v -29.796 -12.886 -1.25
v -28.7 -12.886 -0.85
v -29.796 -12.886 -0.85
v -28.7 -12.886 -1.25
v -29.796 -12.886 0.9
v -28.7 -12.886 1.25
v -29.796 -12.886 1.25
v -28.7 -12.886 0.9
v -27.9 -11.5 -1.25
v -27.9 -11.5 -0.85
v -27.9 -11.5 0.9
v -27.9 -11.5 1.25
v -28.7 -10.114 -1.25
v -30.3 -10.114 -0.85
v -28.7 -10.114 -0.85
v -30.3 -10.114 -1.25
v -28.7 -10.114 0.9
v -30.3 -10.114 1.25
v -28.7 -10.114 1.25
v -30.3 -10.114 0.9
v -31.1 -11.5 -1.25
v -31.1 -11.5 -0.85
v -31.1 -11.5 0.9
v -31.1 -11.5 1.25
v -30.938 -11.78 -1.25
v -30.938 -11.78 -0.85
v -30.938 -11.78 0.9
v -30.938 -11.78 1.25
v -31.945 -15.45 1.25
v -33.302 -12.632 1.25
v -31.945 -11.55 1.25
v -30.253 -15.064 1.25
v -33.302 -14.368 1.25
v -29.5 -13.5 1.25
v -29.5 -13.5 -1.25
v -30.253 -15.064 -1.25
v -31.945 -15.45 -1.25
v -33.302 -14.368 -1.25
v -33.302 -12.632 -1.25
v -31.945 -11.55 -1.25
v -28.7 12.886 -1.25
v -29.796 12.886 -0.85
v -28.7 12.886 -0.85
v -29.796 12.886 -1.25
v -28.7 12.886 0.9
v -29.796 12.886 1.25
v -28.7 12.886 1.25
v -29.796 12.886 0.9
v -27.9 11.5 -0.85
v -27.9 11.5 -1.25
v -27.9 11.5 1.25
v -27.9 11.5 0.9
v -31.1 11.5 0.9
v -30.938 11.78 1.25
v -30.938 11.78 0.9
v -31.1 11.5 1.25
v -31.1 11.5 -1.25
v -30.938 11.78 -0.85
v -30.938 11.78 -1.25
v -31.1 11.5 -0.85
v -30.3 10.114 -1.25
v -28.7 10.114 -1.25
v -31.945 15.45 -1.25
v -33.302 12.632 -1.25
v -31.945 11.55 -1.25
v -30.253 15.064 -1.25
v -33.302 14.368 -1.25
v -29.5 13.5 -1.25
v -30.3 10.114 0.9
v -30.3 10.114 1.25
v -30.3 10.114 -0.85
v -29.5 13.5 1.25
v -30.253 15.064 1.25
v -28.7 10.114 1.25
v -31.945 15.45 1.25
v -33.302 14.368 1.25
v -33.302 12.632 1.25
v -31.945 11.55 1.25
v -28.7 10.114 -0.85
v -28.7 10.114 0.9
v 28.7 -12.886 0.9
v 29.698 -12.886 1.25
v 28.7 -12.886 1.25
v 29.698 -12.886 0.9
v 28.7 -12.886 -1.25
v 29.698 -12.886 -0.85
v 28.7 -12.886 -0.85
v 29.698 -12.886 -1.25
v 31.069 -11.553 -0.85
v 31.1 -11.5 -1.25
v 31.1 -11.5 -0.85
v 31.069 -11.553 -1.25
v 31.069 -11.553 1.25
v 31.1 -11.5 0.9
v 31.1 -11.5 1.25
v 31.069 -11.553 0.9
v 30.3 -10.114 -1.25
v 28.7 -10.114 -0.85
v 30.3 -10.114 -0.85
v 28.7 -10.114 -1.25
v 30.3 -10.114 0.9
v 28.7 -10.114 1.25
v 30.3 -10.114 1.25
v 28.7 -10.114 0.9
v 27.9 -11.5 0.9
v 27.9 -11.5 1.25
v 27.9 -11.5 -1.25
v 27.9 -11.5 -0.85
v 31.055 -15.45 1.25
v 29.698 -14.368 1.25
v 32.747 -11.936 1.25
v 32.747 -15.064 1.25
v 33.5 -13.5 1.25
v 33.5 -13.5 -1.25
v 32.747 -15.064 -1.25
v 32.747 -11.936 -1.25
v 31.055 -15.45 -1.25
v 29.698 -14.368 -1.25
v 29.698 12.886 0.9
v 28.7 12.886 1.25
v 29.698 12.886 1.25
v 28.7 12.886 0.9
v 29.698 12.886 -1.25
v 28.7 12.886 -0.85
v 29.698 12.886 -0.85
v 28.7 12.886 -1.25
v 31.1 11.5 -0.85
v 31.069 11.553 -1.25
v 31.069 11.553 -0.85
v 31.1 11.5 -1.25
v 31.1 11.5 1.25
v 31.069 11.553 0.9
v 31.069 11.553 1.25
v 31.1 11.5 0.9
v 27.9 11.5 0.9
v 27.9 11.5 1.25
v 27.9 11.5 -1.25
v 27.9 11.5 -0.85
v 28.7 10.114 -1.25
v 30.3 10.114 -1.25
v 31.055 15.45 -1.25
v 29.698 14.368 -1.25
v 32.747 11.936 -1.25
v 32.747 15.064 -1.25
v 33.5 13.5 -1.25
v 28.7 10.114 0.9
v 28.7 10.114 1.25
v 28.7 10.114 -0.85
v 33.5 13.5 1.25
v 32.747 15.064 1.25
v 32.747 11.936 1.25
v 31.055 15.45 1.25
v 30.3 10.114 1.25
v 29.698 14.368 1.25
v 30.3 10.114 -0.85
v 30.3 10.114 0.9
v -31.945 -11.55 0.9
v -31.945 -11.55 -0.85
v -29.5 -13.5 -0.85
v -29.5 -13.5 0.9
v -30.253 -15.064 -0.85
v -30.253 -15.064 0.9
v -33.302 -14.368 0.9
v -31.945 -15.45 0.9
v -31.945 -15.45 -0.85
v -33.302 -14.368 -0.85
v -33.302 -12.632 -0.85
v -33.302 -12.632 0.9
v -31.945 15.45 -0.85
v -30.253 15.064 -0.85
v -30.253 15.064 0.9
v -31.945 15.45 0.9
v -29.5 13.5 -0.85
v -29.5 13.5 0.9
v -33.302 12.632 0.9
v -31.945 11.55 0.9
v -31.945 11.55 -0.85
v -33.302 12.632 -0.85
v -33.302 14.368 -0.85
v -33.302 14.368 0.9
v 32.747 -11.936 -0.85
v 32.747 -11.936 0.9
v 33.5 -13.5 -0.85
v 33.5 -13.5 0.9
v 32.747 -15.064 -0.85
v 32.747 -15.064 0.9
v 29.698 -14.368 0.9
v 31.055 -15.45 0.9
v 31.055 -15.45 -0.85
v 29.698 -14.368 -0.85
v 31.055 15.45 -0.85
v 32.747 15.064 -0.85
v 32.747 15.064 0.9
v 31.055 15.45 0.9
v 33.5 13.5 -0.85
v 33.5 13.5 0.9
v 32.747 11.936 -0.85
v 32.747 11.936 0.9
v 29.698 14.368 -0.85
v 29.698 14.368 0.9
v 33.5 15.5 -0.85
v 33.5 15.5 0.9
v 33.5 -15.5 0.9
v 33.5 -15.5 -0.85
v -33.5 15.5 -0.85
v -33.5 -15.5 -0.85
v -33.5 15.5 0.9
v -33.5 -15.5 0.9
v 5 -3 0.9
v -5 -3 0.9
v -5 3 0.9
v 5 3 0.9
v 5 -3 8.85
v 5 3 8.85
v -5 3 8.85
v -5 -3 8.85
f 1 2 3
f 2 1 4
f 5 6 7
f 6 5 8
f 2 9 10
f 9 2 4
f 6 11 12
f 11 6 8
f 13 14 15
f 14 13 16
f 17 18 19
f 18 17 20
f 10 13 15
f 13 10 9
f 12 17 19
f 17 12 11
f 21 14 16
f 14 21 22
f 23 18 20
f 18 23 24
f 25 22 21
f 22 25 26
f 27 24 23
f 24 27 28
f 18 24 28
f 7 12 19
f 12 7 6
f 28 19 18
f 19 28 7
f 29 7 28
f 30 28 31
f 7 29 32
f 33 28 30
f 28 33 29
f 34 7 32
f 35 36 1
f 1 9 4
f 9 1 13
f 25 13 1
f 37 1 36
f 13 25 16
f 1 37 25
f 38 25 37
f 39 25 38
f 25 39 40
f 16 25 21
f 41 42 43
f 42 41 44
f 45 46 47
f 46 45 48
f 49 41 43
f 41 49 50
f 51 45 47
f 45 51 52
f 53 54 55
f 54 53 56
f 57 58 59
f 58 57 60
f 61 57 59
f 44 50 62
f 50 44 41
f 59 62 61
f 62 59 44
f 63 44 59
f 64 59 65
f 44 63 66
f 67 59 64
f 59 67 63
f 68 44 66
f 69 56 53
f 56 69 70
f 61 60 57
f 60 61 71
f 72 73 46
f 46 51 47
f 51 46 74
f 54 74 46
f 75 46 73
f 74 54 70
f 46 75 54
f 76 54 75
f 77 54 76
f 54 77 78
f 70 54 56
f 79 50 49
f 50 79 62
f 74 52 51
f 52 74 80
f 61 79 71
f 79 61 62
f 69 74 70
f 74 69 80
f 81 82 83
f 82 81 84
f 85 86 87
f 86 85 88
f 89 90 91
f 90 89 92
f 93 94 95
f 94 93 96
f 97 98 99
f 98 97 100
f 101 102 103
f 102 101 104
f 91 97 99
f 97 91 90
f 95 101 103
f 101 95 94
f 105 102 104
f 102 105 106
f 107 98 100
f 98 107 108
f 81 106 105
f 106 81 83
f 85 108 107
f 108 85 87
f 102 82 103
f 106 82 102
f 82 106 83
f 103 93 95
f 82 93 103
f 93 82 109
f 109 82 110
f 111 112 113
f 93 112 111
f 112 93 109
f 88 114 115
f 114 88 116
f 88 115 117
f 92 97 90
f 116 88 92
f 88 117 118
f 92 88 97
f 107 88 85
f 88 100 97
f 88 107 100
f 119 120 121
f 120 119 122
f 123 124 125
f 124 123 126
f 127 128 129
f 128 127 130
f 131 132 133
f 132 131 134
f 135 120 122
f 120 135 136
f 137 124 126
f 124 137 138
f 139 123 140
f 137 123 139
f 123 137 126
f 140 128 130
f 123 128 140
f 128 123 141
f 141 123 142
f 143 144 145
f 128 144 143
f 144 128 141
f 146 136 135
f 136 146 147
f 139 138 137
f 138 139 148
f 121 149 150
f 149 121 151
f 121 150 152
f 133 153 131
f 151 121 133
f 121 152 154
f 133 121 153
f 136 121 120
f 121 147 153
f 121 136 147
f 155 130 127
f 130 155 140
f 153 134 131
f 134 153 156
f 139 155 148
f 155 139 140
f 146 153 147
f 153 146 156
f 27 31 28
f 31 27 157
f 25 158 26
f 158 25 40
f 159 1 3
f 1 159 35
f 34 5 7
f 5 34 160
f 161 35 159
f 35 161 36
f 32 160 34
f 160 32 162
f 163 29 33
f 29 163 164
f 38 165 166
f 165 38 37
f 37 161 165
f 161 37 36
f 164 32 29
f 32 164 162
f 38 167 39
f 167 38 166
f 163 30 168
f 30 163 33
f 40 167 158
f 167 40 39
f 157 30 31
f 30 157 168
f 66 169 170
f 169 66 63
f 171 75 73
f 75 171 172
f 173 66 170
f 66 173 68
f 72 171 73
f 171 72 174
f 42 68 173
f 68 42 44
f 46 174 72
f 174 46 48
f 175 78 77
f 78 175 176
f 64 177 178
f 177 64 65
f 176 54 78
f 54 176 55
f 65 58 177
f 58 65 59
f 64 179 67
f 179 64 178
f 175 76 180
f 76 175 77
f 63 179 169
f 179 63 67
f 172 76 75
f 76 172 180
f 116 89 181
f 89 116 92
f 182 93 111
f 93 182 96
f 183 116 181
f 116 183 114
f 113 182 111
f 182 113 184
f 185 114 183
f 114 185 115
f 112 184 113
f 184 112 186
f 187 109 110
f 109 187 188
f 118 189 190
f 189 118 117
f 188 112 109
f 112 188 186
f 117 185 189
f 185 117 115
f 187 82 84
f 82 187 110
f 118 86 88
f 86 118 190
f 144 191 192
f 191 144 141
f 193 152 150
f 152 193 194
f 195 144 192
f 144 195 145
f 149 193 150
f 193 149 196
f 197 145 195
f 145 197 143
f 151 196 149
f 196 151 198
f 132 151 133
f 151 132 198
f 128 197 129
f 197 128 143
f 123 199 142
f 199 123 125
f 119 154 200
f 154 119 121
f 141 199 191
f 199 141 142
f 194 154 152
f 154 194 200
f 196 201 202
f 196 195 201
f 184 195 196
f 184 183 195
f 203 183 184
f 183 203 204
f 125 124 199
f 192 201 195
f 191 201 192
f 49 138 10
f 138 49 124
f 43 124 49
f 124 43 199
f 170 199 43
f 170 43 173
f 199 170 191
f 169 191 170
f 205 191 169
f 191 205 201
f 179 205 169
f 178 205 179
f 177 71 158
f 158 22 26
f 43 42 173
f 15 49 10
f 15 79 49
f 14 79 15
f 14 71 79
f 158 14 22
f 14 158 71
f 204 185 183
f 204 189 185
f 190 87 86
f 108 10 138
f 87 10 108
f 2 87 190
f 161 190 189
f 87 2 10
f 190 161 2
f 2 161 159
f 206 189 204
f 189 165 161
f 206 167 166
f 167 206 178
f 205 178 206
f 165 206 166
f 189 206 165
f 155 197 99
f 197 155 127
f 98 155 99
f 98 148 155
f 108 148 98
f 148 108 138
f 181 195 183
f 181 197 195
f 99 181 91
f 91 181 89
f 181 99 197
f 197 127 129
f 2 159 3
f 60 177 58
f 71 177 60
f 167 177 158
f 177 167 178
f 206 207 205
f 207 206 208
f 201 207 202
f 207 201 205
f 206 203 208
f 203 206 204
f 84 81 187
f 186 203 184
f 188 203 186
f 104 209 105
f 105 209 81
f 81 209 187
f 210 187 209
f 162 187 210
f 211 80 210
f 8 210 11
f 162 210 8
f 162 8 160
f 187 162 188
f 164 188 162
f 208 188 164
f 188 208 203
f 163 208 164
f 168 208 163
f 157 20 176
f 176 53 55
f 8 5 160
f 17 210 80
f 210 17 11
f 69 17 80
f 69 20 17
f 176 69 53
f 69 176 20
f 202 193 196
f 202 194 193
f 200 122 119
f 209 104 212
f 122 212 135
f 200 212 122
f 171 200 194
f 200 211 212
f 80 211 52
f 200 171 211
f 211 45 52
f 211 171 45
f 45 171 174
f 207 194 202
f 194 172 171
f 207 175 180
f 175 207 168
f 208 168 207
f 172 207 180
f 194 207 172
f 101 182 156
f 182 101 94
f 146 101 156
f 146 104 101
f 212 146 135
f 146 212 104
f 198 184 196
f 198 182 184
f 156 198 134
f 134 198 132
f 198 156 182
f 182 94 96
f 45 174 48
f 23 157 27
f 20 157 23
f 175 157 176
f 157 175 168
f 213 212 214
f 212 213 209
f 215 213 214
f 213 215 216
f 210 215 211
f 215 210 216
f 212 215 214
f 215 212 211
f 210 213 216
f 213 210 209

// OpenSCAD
// Parameters
pcb_L = 67; //[33.5:134:0.1]
pcb_W = 31; //[15.5:62:0.1]
pcb_T = 1.7; //[0.85:3.4:0.05]
eps = 0.8; //[0.5:2:0.1]
hole_r = 1.6; //[0.8:3.2:0.1]
hole_edge_margin = 4; //[2:8:0.1]
fillet_r = 2; //[0.5:6:0.1]
silk_T = 0.05; //[0.02:0.2:0.01]
copper_T = 0.035; //[0.01:0.1:0.005]
pad_L = 2; //[1:6:0.1]
pad_W = 1.2; //[0.6:4:0.1]
connector_L = 10; //[5:25:0.5]
connector_W = 6; //[3:15:0.5]
connector_H = 8; //[4:20:0.5]
component_L = 8; //[3:25:0.5]
component_W = 5; //[2:20:0.5]
component_H = 3; //[1:15:0.5]

// Main PCB Body
module pcb_main_body() {
  color([0.0, 0.4, 0.2]) // Green for PCB
  cube([pcb_L, pcb_W, pcb_T], center=true);
}

// Mounting Holes (placeholders)
module mounting_holes() {
  color("Black")
  for (x = [-1, 1])
    for (y = [-1, 1])
      translate([x * (pcb_L/2 - hole_edge_margin), y * (pcb_W/2 - hole_edge_margin), 0])
        cylinder(h=pcb_T + eps, r=hole_r, center=true);
}

// Corner Fillets (placeholders)
module corner_fillets() {
  color("Black")
  for (x = [-1, 1])
    for (y = [-1, 1])
      translate([x * (pcb_L/2 - fillet_r), y * (pcb_W/2 - fillet_r), 0])
        cylinder(h=pcb_T + eps, r=fillet_r, center=true);
}

// Silkscreen Markings (placeholders)
module silkscreen_markings() {
  color("White")
  translate([0, 0, pcb_T/2 + silk_T/2])
    cube([pcb_L, pcb_W, silk_T], center=true);
}

// Copper Pads (placeholders)
module copper_pads() {
  color([0.72, 0.45, 0.2]) // Copper color
  translate([0, 0, pcb_T/2 - copper_T/2])
    cube([pad_L, pad_W, copper_T], center=true);
}

// Connectors (placeholders)
module connectors() {
  color("Gray")
  translate([0, 0, pcb_T/2 + connector_H/2])
    cube([connector_L, connector_W, connector_H], center=true);
}

// Components (placeholders)
module components() {
  color("DimGray")
  translate([0, 0, pcb_T/2 + component_H/2])
    cube([component_L, component_W, component_H], center=true);
}

// Complete PCB Model
module pcb_complete_model() {
  union() {
    pcb_main_body();
    mounting_holes();
    corner_fillets();
    silkscreen_markings();
    copper_pads();
    connectors();
    components();
  }
}

// Final Output
pcb_complete_model();
